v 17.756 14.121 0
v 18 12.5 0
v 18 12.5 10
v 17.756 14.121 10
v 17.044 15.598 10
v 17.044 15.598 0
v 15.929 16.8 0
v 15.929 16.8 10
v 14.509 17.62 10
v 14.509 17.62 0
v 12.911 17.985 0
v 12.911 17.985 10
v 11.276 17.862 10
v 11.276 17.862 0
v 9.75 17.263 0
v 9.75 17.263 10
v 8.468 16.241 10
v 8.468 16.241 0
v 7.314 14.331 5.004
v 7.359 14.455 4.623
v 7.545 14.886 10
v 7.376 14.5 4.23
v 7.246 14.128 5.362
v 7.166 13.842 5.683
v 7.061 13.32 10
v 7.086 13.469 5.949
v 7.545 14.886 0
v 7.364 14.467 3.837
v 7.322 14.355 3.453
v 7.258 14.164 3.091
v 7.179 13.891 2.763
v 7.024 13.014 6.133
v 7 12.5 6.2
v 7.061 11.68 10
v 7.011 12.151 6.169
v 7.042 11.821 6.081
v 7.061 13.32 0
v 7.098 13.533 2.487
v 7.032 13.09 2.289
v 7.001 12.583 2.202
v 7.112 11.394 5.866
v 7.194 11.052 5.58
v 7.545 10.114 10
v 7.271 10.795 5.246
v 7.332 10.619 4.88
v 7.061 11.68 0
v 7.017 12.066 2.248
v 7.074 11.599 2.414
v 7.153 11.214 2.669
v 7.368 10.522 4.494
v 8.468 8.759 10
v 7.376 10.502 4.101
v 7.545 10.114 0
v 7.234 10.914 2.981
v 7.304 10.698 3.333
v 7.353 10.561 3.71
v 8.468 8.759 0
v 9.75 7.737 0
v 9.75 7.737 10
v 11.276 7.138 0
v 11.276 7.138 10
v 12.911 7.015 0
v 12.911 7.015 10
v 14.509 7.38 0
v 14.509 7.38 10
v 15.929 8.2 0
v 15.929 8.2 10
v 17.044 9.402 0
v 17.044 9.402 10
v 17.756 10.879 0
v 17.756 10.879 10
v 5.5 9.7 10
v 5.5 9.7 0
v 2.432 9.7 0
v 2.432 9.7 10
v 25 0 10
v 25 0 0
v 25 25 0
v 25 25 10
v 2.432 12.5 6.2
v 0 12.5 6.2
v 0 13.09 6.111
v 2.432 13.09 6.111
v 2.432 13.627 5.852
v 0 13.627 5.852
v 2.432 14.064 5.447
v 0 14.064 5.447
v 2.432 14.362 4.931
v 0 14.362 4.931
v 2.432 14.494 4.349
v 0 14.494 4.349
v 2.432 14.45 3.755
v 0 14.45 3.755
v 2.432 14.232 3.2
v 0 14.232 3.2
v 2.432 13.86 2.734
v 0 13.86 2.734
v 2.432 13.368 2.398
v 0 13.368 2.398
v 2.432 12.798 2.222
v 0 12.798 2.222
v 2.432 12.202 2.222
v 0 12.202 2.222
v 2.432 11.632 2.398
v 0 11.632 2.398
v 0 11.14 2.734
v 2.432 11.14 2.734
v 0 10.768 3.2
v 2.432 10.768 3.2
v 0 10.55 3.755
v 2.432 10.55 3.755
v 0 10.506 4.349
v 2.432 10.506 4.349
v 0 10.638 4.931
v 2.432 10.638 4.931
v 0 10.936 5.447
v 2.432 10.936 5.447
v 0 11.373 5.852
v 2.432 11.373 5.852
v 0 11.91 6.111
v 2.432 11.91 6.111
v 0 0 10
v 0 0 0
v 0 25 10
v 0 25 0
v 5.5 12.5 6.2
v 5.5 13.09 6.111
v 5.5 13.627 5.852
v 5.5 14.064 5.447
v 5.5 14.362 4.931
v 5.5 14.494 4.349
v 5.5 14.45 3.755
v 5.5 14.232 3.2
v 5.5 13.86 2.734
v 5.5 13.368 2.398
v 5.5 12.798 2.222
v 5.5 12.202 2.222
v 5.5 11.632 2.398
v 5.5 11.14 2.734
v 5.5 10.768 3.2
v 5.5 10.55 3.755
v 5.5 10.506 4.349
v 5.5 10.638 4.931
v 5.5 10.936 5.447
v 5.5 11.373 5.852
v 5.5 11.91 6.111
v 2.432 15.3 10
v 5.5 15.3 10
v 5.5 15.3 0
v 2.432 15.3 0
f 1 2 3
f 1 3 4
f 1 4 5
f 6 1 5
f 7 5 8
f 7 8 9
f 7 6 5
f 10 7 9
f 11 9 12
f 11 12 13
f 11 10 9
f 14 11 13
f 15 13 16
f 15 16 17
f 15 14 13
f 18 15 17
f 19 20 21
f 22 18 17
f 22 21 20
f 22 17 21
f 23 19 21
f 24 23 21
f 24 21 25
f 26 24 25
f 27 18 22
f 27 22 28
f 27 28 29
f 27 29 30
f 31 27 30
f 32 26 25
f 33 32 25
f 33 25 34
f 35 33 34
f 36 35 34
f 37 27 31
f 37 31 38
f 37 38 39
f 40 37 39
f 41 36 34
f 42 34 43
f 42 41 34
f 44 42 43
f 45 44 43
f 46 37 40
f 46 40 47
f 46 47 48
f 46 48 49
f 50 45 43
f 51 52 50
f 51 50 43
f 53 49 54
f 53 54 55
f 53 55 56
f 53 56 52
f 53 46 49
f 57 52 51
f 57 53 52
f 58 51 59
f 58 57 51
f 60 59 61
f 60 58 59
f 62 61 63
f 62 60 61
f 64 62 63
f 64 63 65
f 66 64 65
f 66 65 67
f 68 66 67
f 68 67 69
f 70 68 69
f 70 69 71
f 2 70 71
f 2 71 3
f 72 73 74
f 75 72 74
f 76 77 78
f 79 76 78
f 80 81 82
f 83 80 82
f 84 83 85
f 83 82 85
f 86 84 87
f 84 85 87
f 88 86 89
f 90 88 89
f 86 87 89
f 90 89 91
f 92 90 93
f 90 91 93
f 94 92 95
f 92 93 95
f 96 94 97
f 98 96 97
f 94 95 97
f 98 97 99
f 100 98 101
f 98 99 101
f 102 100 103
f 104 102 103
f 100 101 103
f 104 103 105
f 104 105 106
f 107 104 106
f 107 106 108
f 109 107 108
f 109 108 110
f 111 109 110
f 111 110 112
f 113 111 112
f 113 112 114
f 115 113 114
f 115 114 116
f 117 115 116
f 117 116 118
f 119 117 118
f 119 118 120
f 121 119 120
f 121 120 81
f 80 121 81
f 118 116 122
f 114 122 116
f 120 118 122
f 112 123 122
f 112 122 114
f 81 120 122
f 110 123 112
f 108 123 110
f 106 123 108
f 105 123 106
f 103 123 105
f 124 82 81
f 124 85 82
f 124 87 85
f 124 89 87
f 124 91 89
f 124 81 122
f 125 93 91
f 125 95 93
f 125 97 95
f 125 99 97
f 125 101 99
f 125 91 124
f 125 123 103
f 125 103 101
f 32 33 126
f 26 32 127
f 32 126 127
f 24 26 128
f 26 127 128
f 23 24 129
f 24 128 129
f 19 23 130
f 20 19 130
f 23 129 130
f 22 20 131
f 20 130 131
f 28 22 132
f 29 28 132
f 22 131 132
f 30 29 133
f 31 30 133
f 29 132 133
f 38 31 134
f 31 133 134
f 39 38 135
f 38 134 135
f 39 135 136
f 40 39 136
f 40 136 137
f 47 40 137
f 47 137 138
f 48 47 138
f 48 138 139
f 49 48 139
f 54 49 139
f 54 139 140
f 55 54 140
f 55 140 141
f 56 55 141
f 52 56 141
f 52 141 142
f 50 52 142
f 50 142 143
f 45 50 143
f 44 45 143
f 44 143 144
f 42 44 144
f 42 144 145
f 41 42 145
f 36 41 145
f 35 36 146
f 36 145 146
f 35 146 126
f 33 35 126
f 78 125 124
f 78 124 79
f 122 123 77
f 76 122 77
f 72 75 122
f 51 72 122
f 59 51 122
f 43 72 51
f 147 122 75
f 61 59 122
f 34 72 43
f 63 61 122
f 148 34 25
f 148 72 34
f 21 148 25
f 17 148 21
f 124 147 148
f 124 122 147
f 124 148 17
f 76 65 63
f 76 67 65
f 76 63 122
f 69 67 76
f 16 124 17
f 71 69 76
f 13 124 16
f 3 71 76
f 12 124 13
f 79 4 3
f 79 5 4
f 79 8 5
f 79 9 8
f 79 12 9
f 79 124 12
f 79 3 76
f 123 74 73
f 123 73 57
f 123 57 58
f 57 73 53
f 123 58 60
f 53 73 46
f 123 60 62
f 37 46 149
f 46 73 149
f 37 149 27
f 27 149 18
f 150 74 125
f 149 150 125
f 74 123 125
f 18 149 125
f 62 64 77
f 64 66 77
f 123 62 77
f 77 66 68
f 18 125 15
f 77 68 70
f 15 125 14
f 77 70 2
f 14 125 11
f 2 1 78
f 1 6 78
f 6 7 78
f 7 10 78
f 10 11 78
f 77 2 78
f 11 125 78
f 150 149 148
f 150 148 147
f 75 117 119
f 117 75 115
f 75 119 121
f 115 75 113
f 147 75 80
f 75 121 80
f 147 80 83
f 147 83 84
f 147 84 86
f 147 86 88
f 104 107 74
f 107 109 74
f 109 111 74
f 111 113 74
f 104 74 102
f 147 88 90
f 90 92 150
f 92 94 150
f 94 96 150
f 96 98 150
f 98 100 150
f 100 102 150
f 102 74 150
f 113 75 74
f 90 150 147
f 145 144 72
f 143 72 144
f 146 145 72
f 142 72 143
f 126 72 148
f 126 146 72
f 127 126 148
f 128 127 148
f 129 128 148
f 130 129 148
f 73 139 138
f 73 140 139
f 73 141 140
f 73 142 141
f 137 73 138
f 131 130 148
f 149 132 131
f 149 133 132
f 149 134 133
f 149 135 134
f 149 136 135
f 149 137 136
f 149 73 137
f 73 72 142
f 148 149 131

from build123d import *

# Parameters (mm, degrees)
CROQUIS1_W                 = 25
CROQUIS1_H                 = 25
CROQUIS1_R                 = 5.5
SALIENTE_EXTRUIR1_DEPTH    = 10
CORTAR_EXTRUIR1_REACH      = 38.742
CORTAR_EXTRUIR1_END_RADIUS = 5.5
CROQUIS2_R                 = 2
CROQUIS3_W                 = 3.068049468
CROQUIS3_H                 = 5.6
CORTAR_EXTRUIR2_DEPTH      = 37.742346169


with BuildPart() as part:
    # Croquis1 → Saliente-Extruir1 (new body)
    with BuildSketch(Plane.XY):
        with Locations((12.5, 12.5)):
            Rectangle(CROQUIS1_W, CROQUIS1_H)
        with Locations((12.5, 12.5)):
            Circle(CROQUIS1_R, mode=Mode.SUBTRACT)
    extrude(amount=SALIENTE_EXTRUIR1_DEPTH)

    # Cortar-Extruir1: up to this cylinder (the profile starts outside it)
    cortar_extruir1_end = Plane(origin=(12.5, 12.5, 4.2), z_dir=(0, 0, -1)) * Cylinder(CORTAR_EXTRUIR1_END_RADIUS, 89.484, mode=Mode.PRIVATE)
    # Croquis2 → Cortar-Extruir1 (cut, up to the surface)
    with BuildSketch(Plane.ZY, mode=Mode.PRIVATE) as cortar_extruir1_sk1:
        with Locations((4.2, 12.5)):
            Circle(CROQUIS2_R)
    cortar_extruir1_tool1 = extrude(cortar_extruir1_sk1.sketch, amount=-CORTAR_EXTRUIR1_REACH, mode=Mode.PRIVATE) - cortar_extruir1_end
    add(cortar_extruir1_tool1.solids().sort_by_distance((0, 12.5, 4.2))[0], mode=Mode.SUBTRACT)

    # Croquis3 → Cortar-Extruir2 (cut, through all)
    with BuildSketch(Plane(origin=(0, 0, 0), x_dir=(-1, 0, 0), z_dir=(0, 0, -1))):
        with Locations((-3.965975266, 12.5)):
            Rectangle(CROQUIS3_W, CROQUIS3_H)
    extrude(amount=-CORTAR_EXTRUIR2_DEPTH, mode=Mode.SUBTRACT)


solid = part.part
